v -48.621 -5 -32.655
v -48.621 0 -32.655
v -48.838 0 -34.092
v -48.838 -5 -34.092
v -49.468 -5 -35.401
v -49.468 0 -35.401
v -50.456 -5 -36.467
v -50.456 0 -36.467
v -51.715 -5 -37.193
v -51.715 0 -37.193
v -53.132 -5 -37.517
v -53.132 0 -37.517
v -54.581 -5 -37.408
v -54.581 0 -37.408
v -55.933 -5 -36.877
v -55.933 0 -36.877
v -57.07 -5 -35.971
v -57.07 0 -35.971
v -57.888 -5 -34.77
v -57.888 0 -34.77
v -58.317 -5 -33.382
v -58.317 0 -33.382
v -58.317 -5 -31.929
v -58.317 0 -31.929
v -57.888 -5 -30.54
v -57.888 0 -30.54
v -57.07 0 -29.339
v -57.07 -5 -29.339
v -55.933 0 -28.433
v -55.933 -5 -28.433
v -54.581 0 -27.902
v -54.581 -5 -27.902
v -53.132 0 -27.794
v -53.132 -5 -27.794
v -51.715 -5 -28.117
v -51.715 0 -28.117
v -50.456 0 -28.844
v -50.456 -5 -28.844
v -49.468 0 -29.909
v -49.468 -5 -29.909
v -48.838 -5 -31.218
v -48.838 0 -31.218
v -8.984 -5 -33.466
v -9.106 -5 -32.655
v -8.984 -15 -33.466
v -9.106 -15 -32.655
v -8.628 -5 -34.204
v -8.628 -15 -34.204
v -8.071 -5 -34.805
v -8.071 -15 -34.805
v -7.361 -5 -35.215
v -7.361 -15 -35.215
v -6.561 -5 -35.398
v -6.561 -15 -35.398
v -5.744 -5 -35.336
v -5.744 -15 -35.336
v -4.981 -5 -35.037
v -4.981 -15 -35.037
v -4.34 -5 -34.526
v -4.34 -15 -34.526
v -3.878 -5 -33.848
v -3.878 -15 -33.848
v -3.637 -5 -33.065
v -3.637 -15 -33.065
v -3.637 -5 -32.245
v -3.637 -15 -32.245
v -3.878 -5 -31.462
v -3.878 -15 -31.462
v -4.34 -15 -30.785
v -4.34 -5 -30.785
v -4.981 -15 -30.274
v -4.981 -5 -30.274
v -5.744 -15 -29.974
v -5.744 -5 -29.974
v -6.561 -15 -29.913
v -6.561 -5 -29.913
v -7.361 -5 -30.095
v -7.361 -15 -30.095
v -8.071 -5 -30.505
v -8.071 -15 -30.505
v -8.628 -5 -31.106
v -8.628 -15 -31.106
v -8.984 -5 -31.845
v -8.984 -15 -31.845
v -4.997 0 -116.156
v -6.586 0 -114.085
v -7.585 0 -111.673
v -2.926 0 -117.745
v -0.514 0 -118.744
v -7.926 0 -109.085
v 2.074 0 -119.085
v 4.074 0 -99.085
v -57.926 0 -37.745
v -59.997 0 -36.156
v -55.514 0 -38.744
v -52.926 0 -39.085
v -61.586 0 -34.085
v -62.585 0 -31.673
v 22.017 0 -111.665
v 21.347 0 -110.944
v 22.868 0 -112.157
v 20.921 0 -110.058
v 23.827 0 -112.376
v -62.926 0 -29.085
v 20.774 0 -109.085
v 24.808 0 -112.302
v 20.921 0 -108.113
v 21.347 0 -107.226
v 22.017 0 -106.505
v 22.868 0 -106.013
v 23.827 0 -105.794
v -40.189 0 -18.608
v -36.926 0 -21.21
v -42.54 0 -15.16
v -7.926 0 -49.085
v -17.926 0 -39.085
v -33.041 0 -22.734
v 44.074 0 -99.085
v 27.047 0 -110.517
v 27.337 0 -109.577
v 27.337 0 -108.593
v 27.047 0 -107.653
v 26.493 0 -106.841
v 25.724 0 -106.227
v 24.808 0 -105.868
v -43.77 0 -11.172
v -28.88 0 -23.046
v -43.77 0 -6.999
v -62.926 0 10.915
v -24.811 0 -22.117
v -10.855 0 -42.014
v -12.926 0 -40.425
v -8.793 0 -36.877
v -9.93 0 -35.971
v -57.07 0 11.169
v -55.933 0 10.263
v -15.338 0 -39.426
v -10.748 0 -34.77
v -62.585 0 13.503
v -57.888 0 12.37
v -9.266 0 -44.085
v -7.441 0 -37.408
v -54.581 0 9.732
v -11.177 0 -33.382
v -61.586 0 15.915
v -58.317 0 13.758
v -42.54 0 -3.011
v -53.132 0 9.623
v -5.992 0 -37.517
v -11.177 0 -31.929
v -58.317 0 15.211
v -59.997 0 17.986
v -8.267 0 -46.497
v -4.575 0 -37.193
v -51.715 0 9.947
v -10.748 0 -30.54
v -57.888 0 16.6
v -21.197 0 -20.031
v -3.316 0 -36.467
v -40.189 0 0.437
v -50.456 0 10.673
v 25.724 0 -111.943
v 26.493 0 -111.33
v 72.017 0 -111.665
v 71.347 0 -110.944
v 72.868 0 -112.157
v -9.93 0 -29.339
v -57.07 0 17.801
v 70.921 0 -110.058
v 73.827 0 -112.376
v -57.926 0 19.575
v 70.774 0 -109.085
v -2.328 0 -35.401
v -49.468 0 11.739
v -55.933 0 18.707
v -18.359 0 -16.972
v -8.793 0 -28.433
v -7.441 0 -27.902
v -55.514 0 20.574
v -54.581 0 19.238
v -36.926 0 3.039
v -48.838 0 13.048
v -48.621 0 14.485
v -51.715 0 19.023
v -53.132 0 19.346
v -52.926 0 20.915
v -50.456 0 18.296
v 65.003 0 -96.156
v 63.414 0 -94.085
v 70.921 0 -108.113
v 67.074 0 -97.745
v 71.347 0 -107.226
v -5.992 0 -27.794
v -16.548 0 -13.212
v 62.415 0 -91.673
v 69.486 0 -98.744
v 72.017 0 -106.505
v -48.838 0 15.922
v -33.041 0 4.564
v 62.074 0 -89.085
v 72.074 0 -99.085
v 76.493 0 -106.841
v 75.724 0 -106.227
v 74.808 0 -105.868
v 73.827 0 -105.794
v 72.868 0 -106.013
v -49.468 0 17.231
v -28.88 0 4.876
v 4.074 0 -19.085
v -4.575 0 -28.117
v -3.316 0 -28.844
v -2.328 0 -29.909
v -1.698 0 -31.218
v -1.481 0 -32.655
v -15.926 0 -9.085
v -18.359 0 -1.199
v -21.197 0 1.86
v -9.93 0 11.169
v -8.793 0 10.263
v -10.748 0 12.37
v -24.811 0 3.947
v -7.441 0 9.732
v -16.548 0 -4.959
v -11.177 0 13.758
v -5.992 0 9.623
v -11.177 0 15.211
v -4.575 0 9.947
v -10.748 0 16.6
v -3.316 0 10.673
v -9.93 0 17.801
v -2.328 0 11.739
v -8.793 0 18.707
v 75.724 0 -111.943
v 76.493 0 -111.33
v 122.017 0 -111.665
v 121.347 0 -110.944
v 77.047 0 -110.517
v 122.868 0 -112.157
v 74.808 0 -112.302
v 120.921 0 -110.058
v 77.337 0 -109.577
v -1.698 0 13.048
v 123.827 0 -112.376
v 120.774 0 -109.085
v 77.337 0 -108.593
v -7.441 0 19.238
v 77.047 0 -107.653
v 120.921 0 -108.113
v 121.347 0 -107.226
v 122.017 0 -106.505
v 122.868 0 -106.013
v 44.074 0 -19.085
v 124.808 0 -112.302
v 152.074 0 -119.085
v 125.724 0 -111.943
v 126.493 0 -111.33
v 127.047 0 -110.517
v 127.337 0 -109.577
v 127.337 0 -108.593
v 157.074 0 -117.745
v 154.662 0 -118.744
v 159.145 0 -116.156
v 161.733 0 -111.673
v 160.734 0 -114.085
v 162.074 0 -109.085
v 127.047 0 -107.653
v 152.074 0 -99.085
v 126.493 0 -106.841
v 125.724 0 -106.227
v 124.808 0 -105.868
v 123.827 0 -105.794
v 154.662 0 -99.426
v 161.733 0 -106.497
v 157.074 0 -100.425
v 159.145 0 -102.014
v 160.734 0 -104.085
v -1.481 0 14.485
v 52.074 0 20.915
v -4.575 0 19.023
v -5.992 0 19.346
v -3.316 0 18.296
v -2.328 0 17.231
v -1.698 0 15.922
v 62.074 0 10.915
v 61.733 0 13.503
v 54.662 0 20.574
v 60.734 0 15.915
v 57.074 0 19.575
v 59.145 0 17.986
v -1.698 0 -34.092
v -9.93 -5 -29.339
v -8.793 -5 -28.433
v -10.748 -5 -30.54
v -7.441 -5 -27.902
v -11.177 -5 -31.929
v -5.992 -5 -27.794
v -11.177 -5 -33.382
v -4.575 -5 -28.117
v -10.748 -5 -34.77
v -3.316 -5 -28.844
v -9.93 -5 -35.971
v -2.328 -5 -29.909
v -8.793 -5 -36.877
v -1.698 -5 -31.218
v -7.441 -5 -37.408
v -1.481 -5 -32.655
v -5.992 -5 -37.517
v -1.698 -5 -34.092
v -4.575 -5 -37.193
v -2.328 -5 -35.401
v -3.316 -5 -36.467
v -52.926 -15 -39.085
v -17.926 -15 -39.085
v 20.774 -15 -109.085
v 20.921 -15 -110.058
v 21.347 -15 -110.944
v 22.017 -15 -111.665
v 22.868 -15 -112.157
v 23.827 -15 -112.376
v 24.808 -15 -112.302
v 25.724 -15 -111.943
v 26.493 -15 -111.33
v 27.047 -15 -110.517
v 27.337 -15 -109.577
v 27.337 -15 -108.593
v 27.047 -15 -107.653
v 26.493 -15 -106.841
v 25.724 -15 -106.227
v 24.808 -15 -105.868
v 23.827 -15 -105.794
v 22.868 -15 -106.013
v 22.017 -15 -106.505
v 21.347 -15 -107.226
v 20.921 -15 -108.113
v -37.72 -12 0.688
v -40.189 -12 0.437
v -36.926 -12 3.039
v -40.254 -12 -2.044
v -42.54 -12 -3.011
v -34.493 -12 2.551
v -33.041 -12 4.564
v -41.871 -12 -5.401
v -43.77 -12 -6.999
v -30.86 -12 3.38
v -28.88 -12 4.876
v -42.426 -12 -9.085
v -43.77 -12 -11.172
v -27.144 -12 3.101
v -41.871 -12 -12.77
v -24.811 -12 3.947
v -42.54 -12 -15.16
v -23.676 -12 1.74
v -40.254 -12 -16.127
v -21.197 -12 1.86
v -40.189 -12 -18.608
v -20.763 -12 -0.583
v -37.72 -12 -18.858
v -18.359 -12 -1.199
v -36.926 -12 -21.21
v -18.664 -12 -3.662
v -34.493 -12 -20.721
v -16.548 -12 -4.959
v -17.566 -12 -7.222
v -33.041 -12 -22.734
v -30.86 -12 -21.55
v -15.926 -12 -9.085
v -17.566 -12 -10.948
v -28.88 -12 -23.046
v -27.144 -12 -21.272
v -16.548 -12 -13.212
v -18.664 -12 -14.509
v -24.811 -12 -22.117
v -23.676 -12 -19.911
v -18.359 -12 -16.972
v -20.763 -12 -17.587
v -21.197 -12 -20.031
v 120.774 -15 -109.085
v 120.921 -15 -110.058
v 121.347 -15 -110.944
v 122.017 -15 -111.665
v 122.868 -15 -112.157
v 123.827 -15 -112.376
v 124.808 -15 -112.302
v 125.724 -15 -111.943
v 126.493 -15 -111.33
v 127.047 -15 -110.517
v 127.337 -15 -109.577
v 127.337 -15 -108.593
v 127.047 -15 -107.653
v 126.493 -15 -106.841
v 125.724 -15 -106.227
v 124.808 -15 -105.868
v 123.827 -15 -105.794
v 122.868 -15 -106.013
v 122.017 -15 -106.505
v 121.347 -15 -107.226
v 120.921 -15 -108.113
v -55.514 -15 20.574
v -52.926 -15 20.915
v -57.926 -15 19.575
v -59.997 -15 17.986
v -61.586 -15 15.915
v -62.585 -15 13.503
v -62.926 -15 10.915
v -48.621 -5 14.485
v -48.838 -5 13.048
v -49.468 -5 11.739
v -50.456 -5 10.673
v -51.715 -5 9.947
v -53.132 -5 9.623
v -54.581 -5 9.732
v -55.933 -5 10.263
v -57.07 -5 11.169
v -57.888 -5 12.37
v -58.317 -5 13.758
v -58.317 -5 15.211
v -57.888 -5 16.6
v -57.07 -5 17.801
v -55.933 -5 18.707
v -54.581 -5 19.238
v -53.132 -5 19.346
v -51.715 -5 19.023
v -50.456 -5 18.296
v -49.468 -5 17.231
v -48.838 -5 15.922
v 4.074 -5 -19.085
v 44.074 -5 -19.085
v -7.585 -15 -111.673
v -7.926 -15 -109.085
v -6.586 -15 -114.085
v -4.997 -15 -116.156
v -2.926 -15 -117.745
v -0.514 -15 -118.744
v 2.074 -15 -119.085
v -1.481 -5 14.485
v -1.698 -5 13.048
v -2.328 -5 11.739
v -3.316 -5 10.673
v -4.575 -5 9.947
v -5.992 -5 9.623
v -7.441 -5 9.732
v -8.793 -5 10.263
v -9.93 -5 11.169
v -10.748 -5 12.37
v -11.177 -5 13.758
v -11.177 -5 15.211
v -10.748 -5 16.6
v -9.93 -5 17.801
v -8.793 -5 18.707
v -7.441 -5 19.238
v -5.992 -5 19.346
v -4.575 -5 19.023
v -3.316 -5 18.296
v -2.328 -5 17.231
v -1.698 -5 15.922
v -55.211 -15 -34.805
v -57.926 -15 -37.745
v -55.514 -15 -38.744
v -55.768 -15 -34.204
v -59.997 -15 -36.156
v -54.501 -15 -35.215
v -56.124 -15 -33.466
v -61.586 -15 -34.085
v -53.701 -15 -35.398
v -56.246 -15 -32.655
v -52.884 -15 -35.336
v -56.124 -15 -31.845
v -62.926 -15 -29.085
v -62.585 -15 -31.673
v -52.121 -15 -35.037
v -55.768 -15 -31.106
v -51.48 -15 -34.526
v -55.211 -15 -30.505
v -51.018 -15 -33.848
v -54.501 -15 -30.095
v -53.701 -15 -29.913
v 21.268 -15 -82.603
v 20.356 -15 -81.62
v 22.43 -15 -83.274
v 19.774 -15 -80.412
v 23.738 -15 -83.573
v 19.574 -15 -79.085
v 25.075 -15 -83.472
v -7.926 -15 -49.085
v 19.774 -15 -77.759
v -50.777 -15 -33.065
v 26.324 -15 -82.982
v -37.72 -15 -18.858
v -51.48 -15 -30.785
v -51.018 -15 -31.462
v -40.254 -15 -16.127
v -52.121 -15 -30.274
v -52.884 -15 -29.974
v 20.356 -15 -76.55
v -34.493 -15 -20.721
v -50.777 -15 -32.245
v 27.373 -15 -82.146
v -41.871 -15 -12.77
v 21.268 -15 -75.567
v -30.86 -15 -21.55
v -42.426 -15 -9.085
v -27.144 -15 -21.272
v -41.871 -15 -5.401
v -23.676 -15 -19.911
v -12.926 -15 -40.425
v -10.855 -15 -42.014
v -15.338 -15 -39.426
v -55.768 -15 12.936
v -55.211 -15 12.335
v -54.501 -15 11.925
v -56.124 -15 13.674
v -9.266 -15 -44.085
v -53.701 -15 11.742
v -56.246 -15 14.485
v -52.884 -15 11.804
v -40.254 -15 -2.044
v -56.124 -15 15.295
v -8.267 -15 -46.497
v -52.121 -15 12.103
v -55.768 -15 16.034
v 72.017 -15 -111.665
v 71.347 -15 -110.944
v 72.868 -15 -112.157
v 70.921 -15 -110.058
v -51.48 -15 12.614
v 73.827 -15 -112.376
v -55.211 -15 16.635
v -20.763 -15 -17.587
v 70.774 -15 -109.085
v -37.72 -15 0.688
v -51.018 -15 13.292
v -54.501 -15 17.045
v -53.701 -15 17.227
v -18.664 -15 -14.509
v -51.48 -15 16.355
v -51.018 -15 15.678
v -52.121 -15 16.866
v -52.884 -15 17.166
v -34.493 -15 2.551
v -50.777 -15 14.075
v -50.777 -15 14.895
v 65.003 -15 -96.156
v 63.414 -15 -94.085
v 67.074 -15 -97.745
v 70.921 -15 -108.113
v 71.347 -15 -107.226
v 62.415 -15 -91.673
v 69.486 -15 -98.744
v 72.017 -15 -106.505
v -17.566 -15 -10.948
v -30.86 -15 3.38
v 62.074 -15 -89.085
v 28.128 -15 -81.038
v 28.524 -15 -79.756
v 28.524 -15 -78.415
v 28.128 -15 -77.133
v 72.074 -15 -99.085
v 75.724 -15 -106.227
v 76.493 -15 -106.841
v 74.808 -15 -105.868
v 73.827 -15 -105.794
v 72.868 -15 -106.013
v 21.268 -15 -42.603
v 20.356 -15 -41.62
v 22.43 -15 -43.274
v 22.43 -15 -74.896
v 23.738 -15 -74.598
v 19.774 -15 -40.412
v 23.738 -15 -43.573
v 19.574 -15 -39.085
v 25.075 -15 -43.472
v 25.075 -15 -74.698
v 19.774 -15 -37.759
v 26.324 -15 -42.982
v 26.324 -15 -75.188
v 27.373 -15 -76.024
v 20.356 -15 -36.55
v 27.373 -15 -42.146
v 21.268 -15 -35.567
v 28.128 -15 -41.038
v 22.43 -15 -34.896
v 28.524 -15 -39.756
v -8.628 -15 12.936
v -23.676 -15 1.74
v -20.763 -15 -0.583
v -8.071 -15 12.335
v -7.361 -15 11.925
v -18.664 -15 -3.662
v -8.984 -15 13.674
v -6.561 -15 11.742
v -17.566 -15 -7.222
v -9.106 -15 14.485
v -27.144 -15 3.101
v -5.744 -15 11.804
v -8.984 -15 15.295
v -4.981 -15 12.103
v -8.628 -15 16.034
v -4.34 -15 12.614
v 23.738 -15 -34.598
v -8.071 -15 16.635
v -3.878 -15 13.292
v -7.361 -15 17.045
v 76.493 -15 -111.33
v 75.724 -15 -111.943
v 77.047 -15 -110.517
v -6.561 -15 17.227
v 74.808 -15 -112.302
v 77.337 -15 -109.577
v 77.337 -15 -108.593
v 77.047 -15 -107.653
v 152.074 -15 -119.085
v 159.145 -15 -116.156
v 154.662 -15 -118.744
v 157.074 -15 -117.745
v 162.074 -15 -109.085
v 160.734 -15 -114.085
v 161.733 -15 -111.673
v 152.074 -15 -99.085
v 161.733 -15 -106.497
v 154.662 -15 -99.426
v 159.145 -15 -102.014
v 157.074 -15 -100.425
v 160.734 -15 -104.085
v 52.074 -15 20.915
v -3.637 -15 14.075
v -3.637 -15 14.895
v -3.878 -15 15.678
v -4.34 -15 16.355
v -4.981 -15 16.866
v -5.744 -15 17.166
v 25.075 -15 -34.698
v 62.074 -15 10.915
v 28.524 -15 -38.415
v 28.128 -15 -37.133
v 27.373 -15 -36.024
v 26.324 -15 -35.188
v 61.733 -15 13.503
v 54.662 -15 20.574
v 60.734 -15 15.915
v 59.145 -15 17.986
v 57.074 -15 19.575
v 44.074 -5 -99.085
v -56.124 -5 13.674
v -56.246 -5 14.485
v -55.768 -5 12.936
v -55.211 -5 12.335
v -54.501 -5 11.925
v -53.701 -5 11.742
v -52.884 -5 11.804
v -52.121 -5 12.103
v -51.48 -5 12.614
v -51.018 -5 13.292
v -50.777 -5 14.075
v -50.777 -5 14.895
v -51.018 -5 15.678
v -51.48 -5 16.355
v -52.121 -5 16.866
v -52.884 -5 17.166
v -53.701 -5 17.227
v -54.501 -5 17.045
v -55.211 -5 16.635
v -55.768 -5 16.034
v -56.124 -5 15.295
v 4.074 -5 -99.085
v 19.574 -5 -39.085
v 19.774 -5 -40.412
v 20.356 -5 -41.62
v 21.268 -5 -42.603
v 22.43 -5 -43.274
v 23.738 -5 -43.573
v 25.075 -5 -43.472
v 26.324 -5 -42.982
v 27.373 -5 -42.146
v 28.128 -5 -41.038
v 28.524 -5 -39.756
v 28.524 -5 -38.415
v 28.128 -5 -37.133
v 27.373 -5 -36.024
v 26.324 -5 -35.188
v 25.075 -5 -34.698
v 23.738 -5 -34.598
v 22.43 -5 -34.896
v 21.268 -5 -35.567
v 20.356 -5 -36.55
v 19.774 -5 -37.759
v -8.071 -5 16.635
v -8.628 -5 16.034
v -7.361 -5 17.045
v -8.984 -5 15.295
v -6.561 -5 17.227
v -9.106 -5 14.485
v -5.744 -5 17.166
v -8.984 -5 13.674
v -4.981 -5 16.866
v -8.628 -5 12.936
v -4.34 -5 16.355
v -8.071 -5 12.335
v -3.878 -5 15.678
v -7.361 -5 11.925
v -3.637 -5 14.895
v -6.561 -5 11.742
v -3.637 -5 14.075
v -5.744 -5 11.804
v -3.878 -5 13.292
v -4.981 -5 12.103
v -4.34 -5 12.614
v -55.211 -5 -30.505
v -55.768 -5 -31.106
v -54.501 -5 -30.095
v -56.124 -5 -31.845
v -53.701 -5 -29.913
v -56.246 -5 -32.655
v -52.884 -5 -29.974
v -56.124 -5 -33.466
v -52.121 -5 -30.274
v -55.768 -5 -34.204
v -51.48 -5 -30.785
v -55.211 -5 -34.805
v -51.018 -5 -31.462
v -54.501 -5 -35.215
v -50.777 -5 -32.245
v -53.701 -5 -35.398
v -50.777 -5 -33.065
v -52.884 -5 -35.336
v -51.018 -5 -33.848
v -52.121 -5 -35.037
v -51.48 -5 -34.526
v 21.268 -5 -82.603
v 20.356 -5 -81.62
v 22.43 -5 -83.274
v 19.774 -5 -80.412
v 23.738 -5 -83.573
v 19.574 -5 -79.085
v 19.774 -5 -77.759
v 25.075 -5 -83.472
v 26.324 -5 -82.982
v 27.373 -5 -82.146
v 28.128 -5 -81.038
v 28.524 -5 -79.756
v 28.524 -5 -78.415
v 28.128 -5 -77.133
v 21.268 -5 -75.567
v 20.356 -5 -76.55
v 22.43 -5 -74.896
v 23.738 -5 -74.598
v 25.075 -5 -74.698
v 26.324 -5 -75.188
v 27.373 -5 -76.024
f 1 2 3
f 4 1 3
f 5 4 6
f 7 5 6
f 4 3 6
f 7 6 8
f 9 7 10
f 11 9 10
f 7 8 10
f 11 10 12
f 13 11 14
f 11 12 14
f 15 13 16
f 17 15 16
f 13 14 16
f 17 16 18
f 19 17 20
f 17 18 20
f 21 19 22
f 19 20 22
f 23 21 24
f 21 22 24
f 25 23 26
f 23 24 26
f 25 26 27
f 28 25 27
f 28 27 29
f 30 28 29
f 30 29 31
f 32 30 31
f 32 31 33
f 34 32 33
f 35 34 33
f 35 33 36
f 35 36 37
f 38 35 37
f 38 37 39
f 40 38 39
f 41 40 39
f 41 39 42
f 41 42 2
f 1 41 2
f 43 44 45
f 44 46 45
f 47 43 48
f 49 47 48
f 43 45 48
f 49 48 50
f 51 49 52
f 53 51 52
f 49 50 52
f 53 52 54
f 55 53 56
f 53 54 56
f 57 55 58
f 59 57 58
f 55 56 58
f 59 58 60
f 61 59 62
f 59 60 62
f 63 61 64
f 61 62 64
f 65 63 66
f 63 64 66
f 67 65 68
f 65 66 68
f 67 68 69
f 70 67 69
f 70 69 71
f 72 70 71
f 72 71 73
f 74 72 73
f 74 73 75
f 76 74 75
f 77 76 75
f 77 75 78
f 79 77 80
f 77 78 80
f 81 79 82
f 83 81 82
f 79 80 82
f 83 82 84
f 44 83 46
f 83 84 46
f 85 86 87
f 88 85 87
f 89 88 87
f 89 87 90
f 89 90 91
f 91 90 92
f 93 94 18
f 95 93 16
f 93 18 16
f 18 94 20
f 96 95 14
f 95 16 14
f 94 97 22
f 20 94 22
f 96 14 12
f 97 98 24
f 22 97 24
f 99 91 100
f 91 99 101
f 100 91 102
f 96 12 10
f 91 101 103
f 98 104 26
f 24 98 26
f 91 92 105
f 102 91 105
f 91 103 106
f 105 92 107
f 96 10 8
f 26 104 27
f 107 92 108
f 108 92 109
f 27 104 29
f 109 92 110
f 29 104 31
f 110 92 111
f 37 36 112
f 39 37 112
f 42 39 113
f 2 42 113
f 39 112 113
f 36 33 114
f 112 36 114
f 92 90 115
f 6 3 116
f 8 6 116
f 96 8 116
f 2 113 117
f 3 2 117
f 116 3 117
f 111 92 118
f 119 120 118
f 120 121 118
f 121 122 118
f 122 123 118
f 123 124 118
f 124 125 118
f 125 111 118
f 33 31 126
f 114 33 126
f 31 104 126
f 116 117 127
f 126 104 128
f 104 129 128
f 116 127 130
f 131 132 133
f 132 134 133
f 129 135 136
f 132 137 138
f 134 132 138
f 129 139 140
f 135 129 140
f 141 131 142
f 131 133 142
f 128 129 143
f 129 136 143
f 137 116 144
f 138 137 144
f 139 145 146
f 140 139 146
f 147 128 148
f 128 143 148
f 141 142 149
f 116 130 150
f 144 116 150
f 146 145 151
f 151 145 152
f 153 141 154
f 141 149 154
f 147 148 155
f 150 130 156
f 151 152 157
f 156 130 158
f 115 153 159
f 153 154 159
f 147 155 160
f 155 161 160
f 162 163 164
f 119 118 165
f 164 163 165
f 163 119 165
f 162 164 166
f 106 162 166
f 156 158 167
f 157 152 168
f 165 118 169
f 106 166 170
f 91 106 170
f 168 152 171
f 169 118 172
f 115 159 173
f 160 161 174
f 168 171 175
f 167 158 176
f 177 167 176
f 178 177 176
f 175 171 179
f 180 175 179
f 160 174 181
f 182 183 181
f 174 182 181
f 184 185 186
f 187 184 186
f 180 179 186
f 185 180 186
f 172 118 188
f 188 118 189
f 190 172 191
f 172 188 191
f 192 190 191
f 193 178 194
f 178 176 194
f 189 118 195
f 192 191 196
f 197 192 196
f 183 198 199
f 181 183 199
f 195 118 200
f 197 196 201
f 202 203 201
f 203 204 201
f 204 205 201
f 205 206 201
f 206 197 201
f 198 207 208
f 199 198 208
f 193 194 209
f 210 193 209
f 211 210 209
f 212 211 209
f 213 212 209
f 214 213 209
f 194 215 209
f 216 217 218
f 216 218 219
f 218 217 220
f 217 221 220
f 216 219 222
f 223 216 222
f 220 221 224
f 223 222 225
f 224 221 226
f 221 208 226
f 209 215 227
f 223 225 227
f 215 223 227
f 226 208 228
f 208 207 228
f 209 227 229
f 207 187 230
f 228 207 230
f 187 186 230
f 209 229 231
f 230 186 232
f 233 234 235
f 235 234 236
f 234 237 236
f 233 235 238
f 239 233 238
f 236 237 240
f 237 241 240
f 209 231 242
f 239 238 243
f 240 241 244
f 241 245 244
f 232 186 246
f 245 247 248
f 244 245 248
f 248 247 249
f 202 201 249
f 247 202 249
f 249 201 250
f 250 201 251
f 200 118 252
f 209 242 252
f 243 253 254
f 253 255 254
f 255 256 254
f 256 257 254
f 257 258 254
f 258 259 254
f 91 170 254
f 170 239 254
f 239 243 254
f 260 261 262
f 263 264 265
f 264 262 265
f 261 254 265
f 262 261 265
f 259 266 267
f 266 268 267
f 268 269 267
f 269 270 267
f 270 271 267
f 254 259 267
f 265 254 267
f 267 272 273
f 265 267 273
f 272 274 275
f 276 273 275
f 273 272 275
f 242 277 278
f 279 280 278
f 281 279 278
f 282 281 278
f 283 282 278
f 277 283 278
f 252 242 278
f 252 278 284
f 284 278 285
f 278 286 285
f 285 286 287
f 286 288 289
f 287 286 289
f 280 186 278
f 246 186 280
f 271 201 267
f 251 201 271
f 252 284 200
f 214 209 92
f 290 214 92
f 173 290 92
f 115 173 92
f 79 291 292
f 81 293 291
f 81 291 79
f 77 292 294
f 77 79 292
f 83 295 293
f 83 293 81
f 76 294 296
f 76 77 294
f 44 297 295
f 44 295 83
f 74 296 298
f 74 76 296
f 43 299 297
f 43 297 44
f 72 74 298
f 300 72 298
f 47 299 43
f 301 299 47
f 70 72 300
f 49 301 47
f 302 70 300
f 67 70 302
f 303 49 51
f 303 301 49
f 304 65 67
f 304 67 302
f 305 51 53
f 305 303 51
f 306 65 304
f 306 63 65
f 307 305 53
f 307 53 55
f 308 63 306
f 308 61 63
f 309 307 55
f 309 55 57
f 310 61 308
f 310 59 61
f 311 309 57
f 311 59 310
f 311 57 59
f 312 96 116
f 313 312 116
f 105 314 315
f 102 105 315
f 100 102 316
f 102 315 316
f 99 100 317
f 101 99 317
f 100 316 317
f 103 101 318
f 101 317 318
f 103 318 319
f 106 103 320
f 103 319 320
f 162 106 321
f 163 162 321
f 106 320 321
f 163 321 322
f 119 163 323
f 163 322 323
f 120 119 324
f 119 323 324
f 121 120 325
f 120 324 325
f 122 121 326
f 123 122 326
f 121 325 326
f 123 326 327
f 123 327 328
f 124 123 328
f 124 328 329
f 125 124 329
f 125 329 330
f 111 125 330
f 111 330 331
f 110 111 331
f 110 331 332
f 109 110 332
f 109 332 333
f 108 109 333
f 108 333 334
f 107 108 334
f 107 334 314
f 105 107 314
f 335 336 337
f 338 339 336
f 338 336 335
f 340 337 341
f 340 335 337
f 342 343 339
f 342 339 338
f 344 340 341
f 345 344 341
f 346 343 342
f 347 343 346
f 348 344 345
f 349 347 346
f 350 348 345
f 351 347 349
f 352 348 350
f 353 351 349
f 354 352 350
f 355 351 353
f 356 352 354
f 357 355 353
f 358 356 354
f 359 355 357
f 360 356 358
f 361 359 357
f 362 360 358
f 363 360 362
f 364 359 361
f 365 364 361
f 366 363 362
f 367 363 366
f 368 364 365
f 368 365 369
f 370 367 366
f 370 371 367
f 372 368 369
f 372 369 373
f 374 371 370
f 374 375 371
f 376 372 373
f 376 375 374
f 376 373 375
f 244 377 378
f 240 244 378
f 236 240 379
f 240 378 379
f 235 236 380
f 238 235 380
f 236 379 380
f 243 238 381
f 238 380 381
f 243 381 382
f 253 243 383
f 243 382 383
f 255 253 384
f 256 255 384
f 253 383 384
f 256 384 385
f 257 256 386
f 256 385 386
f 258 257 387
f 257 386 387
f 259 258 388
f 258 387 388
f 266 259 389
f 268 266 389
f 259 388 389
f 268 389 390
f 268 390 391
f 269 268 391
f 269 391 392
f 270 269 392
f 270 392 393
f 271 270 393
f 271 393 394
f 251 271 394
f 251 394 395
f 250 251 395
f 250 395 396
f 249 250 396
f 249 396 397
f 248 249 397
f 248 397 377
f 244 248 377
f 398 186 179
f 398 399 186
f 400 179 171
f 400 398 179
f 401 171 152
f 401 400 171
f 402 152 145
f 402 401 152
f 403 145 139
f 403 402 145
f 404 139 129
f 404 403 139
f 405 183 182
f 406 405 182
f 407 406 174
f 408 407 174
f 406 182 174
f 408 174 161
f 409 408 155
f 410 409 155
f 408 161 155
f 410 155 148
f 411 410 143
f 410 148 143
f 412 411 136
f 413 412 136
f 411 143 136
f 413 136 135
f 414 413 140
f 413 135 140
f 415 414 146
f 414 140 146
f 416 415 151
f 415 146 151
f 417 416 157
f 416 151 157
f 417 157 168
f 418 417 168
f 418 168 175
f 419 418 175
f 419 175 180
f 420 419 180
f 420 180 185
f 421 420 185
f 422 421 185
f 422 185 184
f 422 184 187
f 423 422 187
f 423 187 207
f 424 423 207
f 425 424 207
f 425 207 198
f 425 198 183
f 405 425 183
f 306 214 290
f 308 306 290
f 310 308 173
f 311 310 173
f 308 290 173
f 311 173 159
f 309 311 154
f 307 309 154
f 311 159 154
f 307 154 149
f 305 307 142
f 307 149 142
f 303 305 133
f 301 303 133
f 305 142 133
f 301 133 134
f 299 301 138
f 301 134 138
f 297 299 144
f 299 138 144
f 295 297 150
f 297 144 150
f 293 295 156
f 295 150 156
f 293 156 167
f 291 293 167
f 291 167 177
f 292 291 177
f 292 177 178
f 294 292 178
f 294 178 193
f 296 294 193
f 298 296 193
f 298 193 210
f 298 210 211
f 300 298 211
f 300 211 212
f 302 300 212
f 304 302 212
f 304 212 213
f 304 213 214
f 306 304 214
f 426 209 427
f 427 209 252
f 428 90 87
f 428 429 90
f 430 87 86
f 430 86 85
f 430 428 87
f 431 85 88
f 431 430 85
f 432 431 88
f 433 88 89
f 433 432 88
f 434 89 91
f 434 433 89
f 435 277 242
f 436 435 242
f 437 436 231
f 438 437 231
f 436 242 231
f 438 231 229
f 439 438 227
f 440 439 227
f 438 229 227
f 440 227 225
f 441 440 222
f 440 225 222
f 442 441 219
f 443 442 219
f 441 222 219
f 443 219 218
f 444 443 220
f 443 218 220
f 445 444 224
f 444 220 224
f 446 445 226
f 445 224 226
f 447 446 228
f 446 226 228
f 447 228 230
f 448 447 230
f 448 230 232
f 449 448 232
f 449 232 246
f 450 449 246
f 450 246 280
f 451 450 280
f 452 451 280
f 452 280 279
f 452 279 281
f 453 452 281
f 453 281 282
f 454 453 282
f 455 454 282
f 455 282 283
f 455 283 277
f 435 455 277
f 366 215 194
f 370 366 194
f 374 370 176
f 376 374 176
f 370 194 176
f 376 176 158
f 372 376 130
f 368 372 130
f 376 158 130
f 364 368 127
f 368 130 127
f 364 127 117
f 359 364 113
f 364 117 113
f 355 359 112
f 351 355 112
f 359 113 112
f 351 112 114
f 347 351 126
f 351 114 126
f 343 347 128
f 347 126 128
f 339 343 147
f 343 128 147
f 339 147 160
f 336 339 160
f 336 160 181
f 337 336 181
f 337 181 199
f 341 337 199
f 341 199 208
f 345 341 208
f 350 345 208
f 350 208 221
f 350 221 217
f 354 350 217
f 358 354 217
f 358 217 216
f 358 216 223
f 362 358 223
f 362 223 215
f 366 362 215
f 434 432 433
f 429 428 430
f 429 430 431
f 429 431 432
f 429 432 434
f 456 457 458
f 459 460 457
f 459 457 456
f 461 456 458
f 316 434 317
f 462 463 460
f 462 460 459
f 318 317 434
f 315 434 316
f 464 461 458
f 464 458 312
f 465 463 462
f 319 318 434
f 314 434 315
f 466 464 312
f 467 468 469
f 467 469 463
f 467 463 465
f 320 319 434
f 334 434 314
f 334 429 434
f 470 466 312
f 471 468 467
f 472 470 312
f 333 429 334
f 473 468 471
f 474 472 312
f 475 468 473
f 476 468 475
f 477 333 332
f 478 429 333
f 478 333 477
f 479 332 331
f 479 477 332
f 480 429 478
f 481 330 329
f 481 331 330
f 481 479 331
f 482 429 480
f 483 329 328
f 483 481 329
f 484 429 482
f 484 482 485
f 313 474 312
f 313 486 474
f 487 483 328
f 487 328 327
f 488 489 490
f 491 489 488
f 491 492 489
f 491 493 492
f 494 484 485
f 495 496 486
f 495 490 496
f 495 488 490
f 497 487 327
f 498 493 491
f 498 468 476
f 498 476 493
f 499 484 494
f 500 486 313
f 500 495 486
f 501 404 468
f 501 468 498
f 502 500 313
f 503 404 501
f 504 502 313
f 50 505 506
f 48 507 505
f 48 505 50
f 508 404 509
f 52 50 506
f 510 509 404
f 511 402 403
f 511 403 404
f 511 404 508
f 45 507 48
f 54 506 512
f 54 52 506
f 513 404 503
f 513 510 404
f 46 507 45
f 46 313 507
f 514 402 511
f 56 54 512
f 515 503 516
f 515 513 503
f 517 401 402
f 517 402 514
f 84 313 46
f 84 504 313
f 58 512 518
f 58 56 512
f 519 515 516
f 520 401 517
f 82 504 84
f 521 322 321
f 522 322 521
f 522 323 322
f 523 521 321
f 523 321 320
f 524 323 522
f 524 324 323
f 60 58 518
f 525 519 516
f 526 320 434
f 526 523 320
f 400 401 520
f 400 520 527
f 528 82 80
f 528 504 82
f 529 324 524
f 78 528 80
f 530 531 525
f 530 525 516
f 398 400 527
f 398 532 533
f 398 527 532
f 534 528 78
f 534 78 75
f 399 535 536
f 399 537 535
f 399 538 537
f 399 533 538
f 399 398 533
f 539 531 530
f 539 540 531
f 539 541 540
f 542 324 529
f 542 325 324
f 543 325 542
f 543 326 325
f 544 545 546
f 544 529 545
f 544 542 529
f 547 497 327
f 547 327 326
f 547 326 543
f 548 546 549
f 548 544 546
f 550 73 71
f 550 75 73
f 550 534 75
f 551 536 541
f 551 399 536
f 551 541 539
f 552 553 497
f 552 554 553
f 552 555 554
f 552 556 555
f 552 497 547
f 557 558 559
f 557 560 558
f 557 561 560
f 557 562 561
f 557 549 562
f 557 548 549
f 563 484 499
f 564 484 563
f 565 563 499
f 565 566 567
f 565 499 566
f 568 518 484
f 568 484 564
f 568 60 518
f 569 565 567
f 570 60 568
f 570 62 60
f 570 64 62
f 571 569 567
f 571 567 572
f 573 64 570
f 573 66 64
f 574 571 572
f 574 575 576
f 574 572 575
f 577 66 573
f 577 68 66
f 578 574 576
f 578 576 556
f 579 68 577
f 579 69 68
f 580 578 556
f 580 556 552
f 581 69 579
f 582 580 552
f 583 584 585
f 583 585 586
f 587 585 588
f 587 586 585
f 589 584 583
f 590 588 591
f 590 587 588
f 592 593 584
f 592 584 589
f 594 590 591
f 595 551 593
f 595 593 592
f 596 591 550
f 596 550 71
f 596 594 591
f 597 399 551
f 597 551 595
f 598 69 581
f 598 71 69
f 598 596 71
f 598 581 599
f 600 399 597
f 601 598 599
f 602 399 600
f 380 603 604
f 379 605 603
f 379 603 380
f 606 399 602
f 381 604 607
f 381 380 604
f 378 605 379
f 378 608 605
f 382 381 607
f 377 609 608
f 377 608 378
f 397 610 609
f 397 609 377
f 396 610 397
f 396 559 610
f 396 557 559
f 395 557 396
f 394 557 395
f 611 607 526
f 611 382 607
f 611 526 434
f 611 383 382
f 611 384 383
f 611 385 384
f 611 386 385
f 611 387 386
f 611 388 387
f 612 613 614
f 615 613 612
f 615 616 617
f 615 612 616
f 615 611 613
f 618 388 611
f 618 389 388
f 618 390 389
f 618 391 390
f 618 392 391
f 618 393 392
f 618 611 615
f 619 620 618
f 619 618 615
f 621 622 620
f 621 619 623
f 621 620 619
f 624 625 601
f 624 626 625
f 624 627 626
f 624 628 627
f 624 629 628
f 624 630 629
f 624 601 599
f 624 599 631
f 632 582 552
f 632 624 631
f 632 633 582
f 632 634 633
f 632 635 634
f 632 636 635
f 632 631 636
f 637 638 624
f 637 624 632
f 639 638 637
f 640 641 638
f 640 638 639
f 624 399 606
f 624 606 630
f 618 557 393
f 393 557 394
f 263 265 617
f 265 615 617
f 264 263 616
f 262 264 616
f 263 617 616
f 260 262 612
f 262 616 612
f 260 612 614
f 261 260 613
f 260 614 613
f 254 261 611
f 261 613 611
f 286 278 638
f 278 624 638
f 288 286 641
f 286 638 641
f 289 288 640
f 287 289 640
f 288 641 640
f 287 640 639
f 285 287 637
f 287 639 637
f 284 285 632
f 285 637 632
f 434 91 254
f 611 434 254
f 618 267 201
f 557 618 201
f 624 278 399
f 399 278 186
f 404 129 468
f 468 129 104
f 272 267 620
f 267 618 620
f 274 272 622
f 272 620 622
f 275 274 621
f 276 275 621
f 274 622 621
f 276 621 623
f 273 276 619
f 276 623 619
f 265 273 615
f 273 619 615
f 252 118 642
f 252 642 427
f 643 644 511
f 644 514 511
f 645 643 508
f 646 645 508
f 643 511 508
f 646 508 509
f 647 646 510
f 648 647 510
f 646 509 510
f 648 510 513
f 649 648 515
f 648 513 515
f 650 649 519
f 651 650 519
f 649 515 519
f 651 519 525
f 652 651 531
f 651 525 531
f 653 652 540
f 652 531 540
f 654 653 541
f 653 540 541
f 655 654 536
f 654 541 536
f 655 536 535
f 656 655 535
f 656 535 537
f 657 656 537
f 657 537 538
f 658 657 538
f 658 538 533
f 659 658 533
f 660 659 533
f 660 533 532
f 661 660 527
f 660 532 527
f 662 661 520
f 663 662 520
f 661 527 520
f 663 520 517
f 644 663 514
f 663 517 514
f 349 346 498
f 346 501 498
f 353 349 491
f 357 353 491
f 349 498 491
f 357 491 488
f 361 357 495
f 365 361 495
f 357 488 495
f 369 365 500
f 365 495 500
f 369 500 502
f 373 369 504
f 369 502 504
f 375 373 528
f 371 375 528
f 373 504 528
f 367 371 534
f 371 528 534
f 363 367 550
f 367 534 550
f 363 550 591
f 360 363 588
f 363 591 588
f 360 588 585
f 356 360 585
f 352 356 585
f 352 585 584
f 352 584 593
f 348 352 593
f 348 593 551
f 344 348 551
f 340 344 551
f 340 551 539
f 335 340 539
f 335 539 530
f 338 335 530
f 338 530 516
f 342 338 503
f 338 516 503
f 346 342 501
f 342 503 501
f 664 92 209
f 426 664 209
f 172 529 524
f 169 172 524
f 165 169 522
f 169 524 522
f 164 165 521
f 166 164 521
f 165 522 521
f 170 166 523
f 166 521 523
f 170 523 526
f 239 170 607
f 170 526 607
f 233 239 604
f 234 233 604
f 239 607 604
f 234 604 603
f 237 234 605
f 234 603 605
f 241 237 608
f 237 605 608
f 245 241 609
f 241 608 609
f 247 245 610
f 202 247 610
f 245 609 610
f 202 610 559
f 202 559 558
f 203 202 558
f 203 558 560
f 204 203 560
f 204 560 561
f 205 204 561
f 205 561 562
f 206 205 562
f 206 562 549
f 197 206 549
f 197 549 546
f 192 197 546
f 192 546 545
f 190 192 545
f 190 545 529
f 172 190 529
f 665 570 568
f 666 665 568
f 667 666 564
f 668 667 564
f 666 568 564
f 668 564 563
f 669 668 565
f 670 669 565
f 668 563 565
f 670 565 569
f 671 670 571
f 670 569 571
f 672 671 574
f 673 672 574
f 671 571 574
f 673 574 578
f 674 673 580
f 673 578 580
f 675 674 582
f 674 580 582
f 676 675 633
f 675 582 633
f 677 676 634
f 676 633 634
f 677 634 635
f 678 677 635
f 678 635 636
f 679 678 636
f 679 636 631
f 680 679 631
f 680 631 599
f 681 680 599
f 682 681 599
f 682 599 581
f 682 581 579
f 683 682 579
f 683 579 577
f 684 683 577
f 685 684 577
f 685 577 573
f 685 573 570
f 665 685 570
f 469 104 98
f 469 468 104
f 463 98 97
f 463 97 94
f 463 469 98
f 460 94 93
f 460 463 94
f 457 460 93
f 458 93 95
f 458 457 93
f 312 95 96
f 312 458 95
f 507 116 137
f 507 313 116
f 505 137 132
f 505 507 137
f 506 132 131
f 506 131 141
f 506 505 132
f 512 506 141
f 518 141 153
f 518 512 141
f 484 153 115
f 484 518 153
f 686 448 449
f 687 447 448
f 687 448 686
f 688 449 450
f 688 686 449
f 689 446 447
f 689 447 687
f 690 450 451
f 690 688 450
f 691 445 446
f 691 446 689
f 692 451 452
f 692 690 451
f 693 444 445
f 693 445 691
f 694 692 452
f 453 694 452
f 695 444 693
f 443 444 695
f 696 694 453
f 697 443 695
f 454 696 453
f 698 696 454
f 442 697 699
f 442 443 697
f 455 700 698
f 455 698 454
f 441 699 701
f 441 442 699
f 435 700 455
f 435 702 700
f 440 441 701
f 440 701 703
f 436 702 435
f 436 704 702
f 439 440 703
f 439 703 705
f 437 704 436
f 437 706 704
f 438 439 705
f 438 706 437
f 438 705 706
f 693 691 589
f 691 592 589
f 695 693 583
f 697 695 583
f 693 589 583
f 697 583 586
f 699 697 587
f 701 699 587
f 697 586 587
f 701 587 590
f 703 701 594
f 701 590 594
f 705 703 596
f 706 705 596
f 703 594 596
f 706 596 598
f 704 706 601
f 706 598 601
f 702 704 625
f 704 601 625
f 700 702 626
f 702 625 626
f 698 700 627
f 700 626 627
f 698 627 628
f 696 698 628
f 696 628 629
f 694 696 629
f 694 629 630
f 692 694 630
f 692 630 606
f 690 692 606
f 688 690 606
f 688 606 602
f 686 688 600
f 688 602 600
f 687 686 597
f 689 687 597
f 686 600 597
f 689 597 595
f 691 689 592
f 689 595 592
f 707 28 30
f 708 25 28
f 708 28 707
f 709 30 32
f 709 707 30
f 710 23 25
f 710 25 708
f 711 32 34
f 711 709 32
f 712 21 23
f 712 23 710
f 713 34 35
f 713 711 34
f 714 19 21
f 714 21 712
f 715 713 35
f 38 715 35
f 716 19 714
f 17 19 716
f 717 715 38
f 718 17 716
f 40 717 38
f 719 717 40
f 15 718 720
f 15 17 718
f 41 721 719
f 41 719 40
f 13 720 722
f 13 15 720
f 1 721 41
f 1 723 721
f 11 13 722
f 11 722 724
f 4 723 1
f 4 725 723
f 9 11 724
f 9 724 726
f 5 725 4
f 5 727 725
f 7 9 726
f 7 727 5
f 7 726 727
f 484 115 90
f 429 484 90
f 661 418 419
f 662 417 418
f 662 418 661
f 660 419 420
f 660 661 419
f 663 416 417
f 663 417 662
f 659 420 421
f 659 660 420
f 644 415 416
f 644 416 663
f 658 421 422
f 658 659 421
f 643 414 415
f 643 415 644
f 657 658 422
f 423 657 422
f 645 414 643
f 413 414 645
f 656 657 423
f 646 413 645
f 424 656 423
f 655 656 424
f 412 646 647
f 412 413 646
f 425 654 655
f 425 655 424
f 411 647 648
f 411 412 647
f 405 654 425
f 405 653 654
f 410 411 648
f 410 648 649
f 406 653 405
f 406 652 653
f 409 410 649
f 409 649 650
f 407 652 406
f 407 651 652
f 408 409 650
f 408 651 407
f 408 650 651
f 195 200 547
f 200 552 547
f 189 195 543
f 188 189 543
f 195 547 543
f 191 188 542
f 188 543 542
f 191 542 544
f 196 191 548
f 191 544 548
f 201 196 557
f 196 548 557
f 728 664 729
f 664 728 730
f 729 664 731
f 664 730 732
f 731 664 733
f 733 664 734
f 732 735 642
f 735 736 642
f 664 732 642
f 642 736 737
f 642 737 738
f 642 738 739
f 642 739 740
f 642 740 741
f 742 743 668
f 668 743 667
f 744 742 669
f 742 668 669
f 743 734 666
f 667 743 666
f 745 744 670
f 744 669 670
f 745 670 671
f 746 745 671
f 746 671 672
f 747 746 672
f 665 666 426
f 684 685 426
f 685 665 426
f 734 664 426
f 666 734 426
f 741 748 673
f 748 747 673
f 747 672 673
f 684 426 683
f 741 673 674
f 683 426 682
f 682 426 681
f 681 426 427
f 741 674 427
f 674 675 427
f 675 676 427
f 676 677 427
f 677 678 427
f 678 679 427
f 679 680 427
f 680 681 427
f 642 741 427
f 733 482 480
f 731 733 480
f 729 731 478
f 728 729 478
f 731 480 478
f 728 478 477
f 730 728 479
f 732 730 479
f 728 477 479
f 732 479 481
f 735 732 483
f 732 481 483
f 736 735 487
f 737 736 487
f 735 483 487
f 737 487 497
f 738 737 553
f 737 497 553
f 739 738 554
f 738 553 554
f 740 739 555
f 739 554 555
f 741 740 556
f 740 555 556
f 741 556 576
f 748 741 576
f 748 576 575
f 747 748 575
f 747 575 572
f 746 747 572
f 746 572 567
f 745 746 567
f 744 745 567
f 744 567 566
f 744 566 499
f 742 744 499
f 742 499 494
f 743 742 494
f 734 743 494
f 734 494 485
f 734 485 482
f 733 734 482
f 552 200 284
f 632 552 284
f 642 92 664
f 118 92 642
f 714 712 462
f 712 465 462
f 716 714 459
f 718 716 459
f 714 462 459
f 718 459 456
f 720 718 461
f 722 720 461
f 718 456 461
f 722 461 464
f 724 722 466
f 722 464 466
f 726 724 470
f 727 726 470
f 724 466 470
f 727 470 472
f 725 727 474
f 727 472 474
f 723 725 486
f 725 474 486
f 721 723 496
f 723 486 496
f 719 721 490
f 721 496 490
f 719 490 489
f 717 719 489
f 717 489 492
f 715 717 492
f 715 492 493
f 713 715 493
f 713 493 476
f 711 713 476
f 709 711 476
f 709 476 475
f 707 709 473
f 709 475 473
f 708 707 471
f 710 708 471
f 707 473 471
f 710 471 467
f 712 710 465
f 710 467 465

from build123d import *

# Parameters (mm, degrees)
F1_DEPTH       = 15
F2_D           = 9
F3_D           = 6.6
F4_R           = 9.99999
F5_D           = 25
F5_CBORE_D     = 28
F5_CBORE_DEPTH = 12
F6_D           = 5.5
F6_CBORE_D     = 9.75
F6_CBORE_DEPTH = 5
F7_W           = 40
F7_H           = 80
F8_DEPTH       = 5


# Not quite as in the source:
# - a fillet or chamfer is up to 0.001 mm smaller than in the source, because OpenCascade refuses the exact size


with BuildPart() as f1:
    # F0 (on Front) → F1 (new body)
    with BuildSketch(Plane.XZ):
        Polygon((62.0740194619, 20.9148037434), (-57.9259805381, 20.9148037434), (-62.9259805381, 20.9148037434), (-62.9259805381, -39.0851962566), (-57.9259805381, -39.0851962566), (-7.9259805381, -39.0851962566), (-7.9259805381, -119.0851962566), (162.0740194619, -119.0851962566), (162.0740194619, -99.0851962566), (62.0740194619, -99.0851962566), align=None)
    extrude(amount=F1_DEPTH)

    # F2 (through all)
    with Locations(Plane(origin=(0, 0, 0), x_dir=(1, 0, 0), z_dir=(0, 1, 0))):
        with Locations((24.0740194619, 79.0851962566), (24.0740194619, 39.0851962566)):
            Hole(F2_D / 2)

    # F3 (through all)
    with Locations(Plane(origin=(0, 0, 0), x_dir=(1, 0, 0), z_dir=(0, 1, 0))):
        with Locations((24.0740194619, 109.0851962566), (74.0740194619, 109.0851962566), (124.0740194619, 109.0851962566)):
            Hole(F3_D / 2)

    # F4 (radius 10 in the source; OpenCascade refuses exactly that, so slightly less here)
    f4_edges = [f1.edges().sort_by_distance(p)[0] for p in [
        (62.074019, -7.5, 20.914804),
        (62.074019, -7.5, -99.085196),
        (162.074019, -7.5, -119.085196),
        (162.074019, -7.5, -99.085196),
        (-7.925981, -7.5, -119.085196),
        (-7.925981, -7.5, -39.085196),
        (-62.925981, -7.5, 20.914804),
        (-62.925981, -7.5, -39.085196),
    ]]
    fillet(f4_edges, radius=F4_R)

    # F5 (through all)
    with Locations(Plane(origin=(0, 0, 0), x_dir=(1, 0, 0), z_dir=(0, 1, 0))):
        with Locations((-29.9259805381, 9.0851962566)):
            CounterBoreHole(F5_D / 2, F5_CBORE_D / 2, F5_CBORE_DEPTH)

    # F6 (through all)
    with Locations(Plane(origin=(0, 0, 0), x_dir=(1, 0, 0), z_dir=(0, 1, 0))):
        with Locations((-53.4959805381, -14.4848037434), (-6.3559805381, -14.4848037434), (-6.3559805381, 32.6551962566), (-53.4959805381, 32.6551962566)):
            CounterBoreHole(F6_D / 2, F6_CBORE_D / 2, F6_CBORE_DEPTH)

    # F7 (on face) → F8 (cut)
    with BuildSketch(Plane.XZ):
        with Locations((24.0740194619, -59.0851962566)):
            Rectangle(F7_W, F7_H)
    extrude(amount=F8_DEPTH, mode=Mode.SUBTRACT)


solid = f1.part
